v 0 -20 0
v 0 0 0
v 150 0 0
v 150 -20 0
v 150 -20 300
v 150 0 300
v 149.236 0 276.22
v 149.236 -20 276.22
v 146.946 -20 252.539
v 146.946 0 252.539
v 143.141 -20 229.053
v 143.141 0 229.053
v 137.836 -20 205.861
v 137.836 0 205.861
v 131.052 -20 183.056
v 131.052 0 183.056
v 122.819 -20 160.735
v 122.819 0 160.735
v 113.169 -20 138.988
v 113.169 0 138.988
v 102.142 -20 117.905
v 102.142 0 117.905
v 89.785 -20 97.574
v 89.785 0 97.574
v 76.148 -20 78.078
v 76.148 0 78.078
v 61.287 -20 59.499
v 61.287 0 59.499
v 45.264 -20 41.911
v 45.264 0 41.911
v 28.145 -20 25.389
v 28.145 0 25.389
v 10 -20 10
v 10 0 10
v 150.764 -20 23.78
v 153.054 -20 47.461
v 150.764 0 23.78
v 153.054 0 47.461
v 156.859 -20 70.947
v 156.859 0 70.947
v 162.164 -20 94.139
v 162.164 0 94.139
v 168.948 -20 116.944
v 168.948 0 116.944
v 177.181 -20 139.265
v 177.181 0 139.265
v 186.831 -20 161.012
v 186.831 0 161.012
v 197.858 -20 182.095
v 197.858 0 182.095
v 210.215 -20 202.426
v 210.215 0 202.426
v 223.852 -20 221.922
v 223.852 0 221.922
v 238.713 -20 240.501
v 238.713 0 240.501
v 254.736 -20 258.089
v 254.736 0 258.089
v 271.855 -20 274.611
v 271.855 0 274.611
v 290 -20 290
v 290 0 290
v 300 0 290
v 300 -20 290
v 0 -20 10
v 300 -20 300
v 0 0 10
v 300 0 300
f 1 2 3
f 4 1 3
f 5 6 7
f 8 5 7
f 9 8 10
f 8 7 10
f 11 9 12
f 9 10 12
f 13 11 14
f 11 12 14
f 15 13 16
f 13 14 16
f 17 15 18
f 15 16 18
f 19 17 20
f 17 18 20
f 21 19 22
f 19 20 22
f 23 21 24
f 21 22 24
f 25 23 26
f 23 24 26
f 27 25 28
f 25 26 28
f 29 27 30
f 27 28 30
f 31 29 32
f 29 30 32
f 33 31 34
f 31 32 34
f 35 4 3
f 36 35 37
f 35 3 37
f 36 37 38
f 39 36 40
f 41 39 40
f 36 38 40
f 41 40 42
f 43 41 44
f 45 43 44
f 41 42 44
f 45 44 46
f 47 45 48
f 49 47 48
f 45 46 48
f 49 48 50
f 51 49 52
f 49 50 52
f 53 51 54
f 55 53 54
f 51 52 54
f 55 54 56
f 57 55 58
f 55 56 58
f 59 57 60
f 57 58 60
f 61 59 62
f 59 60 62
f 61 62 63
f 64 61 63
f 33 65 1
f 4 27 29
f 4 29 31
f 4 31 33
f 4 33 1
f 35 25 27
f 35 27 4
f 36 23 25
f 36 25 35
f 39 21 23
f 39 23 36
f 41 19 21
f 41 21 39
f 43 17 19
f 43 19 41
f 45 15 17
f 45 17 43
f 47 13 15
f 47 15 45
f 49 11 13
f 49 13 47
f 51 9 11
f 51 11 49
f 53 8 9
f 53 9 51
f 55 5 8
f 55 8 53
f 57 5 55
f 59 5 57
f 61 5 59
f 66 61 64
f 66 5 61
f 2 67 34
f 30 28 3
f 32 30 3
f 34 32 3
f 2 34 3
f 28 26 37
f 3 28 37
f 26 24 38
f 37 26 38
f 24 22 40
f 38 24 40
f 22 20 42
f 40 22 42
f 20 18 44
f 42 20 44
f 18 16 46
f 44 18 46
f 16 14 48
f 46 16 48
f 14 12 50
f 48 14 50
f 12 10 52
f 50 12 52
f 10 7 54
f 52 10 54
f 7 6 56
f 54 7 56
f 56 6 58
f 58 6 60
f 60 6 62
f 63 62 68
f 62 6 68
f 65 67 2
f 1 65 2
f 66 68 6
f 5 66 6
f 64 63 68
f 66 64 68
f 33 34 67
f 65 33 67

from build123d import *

# Parameters (mm, degrees)
F1_DEPTH = 20


with BuildPart() as f1:
    # F0 (on Front) → F1 (new body)
    with BuildSketch(Plane.XZ):
        with BuildLine():
            Line((0, 10), (0, 0))
            Line((0, 0), (150, 0))
            Line((150, 0), (150, 300))
            ThreePointArc((150, 300), (113.168588, 138.987578), (10, 10))
            Line((10, 10), (0, 10))
        make_face()
        with BuildLine():
            Line((150, 300), (150, 0))
            ThreePointArc((150, 0), (186.831412, 161.012422), (290, 290))
            Line((290, 290), (300, 290))
            Line((300, 290), (300, 300))
            Line((300, 300), (150, 300))
        make_face()
    extrude(amount=F1_DEPTH)


solid = f1.part
